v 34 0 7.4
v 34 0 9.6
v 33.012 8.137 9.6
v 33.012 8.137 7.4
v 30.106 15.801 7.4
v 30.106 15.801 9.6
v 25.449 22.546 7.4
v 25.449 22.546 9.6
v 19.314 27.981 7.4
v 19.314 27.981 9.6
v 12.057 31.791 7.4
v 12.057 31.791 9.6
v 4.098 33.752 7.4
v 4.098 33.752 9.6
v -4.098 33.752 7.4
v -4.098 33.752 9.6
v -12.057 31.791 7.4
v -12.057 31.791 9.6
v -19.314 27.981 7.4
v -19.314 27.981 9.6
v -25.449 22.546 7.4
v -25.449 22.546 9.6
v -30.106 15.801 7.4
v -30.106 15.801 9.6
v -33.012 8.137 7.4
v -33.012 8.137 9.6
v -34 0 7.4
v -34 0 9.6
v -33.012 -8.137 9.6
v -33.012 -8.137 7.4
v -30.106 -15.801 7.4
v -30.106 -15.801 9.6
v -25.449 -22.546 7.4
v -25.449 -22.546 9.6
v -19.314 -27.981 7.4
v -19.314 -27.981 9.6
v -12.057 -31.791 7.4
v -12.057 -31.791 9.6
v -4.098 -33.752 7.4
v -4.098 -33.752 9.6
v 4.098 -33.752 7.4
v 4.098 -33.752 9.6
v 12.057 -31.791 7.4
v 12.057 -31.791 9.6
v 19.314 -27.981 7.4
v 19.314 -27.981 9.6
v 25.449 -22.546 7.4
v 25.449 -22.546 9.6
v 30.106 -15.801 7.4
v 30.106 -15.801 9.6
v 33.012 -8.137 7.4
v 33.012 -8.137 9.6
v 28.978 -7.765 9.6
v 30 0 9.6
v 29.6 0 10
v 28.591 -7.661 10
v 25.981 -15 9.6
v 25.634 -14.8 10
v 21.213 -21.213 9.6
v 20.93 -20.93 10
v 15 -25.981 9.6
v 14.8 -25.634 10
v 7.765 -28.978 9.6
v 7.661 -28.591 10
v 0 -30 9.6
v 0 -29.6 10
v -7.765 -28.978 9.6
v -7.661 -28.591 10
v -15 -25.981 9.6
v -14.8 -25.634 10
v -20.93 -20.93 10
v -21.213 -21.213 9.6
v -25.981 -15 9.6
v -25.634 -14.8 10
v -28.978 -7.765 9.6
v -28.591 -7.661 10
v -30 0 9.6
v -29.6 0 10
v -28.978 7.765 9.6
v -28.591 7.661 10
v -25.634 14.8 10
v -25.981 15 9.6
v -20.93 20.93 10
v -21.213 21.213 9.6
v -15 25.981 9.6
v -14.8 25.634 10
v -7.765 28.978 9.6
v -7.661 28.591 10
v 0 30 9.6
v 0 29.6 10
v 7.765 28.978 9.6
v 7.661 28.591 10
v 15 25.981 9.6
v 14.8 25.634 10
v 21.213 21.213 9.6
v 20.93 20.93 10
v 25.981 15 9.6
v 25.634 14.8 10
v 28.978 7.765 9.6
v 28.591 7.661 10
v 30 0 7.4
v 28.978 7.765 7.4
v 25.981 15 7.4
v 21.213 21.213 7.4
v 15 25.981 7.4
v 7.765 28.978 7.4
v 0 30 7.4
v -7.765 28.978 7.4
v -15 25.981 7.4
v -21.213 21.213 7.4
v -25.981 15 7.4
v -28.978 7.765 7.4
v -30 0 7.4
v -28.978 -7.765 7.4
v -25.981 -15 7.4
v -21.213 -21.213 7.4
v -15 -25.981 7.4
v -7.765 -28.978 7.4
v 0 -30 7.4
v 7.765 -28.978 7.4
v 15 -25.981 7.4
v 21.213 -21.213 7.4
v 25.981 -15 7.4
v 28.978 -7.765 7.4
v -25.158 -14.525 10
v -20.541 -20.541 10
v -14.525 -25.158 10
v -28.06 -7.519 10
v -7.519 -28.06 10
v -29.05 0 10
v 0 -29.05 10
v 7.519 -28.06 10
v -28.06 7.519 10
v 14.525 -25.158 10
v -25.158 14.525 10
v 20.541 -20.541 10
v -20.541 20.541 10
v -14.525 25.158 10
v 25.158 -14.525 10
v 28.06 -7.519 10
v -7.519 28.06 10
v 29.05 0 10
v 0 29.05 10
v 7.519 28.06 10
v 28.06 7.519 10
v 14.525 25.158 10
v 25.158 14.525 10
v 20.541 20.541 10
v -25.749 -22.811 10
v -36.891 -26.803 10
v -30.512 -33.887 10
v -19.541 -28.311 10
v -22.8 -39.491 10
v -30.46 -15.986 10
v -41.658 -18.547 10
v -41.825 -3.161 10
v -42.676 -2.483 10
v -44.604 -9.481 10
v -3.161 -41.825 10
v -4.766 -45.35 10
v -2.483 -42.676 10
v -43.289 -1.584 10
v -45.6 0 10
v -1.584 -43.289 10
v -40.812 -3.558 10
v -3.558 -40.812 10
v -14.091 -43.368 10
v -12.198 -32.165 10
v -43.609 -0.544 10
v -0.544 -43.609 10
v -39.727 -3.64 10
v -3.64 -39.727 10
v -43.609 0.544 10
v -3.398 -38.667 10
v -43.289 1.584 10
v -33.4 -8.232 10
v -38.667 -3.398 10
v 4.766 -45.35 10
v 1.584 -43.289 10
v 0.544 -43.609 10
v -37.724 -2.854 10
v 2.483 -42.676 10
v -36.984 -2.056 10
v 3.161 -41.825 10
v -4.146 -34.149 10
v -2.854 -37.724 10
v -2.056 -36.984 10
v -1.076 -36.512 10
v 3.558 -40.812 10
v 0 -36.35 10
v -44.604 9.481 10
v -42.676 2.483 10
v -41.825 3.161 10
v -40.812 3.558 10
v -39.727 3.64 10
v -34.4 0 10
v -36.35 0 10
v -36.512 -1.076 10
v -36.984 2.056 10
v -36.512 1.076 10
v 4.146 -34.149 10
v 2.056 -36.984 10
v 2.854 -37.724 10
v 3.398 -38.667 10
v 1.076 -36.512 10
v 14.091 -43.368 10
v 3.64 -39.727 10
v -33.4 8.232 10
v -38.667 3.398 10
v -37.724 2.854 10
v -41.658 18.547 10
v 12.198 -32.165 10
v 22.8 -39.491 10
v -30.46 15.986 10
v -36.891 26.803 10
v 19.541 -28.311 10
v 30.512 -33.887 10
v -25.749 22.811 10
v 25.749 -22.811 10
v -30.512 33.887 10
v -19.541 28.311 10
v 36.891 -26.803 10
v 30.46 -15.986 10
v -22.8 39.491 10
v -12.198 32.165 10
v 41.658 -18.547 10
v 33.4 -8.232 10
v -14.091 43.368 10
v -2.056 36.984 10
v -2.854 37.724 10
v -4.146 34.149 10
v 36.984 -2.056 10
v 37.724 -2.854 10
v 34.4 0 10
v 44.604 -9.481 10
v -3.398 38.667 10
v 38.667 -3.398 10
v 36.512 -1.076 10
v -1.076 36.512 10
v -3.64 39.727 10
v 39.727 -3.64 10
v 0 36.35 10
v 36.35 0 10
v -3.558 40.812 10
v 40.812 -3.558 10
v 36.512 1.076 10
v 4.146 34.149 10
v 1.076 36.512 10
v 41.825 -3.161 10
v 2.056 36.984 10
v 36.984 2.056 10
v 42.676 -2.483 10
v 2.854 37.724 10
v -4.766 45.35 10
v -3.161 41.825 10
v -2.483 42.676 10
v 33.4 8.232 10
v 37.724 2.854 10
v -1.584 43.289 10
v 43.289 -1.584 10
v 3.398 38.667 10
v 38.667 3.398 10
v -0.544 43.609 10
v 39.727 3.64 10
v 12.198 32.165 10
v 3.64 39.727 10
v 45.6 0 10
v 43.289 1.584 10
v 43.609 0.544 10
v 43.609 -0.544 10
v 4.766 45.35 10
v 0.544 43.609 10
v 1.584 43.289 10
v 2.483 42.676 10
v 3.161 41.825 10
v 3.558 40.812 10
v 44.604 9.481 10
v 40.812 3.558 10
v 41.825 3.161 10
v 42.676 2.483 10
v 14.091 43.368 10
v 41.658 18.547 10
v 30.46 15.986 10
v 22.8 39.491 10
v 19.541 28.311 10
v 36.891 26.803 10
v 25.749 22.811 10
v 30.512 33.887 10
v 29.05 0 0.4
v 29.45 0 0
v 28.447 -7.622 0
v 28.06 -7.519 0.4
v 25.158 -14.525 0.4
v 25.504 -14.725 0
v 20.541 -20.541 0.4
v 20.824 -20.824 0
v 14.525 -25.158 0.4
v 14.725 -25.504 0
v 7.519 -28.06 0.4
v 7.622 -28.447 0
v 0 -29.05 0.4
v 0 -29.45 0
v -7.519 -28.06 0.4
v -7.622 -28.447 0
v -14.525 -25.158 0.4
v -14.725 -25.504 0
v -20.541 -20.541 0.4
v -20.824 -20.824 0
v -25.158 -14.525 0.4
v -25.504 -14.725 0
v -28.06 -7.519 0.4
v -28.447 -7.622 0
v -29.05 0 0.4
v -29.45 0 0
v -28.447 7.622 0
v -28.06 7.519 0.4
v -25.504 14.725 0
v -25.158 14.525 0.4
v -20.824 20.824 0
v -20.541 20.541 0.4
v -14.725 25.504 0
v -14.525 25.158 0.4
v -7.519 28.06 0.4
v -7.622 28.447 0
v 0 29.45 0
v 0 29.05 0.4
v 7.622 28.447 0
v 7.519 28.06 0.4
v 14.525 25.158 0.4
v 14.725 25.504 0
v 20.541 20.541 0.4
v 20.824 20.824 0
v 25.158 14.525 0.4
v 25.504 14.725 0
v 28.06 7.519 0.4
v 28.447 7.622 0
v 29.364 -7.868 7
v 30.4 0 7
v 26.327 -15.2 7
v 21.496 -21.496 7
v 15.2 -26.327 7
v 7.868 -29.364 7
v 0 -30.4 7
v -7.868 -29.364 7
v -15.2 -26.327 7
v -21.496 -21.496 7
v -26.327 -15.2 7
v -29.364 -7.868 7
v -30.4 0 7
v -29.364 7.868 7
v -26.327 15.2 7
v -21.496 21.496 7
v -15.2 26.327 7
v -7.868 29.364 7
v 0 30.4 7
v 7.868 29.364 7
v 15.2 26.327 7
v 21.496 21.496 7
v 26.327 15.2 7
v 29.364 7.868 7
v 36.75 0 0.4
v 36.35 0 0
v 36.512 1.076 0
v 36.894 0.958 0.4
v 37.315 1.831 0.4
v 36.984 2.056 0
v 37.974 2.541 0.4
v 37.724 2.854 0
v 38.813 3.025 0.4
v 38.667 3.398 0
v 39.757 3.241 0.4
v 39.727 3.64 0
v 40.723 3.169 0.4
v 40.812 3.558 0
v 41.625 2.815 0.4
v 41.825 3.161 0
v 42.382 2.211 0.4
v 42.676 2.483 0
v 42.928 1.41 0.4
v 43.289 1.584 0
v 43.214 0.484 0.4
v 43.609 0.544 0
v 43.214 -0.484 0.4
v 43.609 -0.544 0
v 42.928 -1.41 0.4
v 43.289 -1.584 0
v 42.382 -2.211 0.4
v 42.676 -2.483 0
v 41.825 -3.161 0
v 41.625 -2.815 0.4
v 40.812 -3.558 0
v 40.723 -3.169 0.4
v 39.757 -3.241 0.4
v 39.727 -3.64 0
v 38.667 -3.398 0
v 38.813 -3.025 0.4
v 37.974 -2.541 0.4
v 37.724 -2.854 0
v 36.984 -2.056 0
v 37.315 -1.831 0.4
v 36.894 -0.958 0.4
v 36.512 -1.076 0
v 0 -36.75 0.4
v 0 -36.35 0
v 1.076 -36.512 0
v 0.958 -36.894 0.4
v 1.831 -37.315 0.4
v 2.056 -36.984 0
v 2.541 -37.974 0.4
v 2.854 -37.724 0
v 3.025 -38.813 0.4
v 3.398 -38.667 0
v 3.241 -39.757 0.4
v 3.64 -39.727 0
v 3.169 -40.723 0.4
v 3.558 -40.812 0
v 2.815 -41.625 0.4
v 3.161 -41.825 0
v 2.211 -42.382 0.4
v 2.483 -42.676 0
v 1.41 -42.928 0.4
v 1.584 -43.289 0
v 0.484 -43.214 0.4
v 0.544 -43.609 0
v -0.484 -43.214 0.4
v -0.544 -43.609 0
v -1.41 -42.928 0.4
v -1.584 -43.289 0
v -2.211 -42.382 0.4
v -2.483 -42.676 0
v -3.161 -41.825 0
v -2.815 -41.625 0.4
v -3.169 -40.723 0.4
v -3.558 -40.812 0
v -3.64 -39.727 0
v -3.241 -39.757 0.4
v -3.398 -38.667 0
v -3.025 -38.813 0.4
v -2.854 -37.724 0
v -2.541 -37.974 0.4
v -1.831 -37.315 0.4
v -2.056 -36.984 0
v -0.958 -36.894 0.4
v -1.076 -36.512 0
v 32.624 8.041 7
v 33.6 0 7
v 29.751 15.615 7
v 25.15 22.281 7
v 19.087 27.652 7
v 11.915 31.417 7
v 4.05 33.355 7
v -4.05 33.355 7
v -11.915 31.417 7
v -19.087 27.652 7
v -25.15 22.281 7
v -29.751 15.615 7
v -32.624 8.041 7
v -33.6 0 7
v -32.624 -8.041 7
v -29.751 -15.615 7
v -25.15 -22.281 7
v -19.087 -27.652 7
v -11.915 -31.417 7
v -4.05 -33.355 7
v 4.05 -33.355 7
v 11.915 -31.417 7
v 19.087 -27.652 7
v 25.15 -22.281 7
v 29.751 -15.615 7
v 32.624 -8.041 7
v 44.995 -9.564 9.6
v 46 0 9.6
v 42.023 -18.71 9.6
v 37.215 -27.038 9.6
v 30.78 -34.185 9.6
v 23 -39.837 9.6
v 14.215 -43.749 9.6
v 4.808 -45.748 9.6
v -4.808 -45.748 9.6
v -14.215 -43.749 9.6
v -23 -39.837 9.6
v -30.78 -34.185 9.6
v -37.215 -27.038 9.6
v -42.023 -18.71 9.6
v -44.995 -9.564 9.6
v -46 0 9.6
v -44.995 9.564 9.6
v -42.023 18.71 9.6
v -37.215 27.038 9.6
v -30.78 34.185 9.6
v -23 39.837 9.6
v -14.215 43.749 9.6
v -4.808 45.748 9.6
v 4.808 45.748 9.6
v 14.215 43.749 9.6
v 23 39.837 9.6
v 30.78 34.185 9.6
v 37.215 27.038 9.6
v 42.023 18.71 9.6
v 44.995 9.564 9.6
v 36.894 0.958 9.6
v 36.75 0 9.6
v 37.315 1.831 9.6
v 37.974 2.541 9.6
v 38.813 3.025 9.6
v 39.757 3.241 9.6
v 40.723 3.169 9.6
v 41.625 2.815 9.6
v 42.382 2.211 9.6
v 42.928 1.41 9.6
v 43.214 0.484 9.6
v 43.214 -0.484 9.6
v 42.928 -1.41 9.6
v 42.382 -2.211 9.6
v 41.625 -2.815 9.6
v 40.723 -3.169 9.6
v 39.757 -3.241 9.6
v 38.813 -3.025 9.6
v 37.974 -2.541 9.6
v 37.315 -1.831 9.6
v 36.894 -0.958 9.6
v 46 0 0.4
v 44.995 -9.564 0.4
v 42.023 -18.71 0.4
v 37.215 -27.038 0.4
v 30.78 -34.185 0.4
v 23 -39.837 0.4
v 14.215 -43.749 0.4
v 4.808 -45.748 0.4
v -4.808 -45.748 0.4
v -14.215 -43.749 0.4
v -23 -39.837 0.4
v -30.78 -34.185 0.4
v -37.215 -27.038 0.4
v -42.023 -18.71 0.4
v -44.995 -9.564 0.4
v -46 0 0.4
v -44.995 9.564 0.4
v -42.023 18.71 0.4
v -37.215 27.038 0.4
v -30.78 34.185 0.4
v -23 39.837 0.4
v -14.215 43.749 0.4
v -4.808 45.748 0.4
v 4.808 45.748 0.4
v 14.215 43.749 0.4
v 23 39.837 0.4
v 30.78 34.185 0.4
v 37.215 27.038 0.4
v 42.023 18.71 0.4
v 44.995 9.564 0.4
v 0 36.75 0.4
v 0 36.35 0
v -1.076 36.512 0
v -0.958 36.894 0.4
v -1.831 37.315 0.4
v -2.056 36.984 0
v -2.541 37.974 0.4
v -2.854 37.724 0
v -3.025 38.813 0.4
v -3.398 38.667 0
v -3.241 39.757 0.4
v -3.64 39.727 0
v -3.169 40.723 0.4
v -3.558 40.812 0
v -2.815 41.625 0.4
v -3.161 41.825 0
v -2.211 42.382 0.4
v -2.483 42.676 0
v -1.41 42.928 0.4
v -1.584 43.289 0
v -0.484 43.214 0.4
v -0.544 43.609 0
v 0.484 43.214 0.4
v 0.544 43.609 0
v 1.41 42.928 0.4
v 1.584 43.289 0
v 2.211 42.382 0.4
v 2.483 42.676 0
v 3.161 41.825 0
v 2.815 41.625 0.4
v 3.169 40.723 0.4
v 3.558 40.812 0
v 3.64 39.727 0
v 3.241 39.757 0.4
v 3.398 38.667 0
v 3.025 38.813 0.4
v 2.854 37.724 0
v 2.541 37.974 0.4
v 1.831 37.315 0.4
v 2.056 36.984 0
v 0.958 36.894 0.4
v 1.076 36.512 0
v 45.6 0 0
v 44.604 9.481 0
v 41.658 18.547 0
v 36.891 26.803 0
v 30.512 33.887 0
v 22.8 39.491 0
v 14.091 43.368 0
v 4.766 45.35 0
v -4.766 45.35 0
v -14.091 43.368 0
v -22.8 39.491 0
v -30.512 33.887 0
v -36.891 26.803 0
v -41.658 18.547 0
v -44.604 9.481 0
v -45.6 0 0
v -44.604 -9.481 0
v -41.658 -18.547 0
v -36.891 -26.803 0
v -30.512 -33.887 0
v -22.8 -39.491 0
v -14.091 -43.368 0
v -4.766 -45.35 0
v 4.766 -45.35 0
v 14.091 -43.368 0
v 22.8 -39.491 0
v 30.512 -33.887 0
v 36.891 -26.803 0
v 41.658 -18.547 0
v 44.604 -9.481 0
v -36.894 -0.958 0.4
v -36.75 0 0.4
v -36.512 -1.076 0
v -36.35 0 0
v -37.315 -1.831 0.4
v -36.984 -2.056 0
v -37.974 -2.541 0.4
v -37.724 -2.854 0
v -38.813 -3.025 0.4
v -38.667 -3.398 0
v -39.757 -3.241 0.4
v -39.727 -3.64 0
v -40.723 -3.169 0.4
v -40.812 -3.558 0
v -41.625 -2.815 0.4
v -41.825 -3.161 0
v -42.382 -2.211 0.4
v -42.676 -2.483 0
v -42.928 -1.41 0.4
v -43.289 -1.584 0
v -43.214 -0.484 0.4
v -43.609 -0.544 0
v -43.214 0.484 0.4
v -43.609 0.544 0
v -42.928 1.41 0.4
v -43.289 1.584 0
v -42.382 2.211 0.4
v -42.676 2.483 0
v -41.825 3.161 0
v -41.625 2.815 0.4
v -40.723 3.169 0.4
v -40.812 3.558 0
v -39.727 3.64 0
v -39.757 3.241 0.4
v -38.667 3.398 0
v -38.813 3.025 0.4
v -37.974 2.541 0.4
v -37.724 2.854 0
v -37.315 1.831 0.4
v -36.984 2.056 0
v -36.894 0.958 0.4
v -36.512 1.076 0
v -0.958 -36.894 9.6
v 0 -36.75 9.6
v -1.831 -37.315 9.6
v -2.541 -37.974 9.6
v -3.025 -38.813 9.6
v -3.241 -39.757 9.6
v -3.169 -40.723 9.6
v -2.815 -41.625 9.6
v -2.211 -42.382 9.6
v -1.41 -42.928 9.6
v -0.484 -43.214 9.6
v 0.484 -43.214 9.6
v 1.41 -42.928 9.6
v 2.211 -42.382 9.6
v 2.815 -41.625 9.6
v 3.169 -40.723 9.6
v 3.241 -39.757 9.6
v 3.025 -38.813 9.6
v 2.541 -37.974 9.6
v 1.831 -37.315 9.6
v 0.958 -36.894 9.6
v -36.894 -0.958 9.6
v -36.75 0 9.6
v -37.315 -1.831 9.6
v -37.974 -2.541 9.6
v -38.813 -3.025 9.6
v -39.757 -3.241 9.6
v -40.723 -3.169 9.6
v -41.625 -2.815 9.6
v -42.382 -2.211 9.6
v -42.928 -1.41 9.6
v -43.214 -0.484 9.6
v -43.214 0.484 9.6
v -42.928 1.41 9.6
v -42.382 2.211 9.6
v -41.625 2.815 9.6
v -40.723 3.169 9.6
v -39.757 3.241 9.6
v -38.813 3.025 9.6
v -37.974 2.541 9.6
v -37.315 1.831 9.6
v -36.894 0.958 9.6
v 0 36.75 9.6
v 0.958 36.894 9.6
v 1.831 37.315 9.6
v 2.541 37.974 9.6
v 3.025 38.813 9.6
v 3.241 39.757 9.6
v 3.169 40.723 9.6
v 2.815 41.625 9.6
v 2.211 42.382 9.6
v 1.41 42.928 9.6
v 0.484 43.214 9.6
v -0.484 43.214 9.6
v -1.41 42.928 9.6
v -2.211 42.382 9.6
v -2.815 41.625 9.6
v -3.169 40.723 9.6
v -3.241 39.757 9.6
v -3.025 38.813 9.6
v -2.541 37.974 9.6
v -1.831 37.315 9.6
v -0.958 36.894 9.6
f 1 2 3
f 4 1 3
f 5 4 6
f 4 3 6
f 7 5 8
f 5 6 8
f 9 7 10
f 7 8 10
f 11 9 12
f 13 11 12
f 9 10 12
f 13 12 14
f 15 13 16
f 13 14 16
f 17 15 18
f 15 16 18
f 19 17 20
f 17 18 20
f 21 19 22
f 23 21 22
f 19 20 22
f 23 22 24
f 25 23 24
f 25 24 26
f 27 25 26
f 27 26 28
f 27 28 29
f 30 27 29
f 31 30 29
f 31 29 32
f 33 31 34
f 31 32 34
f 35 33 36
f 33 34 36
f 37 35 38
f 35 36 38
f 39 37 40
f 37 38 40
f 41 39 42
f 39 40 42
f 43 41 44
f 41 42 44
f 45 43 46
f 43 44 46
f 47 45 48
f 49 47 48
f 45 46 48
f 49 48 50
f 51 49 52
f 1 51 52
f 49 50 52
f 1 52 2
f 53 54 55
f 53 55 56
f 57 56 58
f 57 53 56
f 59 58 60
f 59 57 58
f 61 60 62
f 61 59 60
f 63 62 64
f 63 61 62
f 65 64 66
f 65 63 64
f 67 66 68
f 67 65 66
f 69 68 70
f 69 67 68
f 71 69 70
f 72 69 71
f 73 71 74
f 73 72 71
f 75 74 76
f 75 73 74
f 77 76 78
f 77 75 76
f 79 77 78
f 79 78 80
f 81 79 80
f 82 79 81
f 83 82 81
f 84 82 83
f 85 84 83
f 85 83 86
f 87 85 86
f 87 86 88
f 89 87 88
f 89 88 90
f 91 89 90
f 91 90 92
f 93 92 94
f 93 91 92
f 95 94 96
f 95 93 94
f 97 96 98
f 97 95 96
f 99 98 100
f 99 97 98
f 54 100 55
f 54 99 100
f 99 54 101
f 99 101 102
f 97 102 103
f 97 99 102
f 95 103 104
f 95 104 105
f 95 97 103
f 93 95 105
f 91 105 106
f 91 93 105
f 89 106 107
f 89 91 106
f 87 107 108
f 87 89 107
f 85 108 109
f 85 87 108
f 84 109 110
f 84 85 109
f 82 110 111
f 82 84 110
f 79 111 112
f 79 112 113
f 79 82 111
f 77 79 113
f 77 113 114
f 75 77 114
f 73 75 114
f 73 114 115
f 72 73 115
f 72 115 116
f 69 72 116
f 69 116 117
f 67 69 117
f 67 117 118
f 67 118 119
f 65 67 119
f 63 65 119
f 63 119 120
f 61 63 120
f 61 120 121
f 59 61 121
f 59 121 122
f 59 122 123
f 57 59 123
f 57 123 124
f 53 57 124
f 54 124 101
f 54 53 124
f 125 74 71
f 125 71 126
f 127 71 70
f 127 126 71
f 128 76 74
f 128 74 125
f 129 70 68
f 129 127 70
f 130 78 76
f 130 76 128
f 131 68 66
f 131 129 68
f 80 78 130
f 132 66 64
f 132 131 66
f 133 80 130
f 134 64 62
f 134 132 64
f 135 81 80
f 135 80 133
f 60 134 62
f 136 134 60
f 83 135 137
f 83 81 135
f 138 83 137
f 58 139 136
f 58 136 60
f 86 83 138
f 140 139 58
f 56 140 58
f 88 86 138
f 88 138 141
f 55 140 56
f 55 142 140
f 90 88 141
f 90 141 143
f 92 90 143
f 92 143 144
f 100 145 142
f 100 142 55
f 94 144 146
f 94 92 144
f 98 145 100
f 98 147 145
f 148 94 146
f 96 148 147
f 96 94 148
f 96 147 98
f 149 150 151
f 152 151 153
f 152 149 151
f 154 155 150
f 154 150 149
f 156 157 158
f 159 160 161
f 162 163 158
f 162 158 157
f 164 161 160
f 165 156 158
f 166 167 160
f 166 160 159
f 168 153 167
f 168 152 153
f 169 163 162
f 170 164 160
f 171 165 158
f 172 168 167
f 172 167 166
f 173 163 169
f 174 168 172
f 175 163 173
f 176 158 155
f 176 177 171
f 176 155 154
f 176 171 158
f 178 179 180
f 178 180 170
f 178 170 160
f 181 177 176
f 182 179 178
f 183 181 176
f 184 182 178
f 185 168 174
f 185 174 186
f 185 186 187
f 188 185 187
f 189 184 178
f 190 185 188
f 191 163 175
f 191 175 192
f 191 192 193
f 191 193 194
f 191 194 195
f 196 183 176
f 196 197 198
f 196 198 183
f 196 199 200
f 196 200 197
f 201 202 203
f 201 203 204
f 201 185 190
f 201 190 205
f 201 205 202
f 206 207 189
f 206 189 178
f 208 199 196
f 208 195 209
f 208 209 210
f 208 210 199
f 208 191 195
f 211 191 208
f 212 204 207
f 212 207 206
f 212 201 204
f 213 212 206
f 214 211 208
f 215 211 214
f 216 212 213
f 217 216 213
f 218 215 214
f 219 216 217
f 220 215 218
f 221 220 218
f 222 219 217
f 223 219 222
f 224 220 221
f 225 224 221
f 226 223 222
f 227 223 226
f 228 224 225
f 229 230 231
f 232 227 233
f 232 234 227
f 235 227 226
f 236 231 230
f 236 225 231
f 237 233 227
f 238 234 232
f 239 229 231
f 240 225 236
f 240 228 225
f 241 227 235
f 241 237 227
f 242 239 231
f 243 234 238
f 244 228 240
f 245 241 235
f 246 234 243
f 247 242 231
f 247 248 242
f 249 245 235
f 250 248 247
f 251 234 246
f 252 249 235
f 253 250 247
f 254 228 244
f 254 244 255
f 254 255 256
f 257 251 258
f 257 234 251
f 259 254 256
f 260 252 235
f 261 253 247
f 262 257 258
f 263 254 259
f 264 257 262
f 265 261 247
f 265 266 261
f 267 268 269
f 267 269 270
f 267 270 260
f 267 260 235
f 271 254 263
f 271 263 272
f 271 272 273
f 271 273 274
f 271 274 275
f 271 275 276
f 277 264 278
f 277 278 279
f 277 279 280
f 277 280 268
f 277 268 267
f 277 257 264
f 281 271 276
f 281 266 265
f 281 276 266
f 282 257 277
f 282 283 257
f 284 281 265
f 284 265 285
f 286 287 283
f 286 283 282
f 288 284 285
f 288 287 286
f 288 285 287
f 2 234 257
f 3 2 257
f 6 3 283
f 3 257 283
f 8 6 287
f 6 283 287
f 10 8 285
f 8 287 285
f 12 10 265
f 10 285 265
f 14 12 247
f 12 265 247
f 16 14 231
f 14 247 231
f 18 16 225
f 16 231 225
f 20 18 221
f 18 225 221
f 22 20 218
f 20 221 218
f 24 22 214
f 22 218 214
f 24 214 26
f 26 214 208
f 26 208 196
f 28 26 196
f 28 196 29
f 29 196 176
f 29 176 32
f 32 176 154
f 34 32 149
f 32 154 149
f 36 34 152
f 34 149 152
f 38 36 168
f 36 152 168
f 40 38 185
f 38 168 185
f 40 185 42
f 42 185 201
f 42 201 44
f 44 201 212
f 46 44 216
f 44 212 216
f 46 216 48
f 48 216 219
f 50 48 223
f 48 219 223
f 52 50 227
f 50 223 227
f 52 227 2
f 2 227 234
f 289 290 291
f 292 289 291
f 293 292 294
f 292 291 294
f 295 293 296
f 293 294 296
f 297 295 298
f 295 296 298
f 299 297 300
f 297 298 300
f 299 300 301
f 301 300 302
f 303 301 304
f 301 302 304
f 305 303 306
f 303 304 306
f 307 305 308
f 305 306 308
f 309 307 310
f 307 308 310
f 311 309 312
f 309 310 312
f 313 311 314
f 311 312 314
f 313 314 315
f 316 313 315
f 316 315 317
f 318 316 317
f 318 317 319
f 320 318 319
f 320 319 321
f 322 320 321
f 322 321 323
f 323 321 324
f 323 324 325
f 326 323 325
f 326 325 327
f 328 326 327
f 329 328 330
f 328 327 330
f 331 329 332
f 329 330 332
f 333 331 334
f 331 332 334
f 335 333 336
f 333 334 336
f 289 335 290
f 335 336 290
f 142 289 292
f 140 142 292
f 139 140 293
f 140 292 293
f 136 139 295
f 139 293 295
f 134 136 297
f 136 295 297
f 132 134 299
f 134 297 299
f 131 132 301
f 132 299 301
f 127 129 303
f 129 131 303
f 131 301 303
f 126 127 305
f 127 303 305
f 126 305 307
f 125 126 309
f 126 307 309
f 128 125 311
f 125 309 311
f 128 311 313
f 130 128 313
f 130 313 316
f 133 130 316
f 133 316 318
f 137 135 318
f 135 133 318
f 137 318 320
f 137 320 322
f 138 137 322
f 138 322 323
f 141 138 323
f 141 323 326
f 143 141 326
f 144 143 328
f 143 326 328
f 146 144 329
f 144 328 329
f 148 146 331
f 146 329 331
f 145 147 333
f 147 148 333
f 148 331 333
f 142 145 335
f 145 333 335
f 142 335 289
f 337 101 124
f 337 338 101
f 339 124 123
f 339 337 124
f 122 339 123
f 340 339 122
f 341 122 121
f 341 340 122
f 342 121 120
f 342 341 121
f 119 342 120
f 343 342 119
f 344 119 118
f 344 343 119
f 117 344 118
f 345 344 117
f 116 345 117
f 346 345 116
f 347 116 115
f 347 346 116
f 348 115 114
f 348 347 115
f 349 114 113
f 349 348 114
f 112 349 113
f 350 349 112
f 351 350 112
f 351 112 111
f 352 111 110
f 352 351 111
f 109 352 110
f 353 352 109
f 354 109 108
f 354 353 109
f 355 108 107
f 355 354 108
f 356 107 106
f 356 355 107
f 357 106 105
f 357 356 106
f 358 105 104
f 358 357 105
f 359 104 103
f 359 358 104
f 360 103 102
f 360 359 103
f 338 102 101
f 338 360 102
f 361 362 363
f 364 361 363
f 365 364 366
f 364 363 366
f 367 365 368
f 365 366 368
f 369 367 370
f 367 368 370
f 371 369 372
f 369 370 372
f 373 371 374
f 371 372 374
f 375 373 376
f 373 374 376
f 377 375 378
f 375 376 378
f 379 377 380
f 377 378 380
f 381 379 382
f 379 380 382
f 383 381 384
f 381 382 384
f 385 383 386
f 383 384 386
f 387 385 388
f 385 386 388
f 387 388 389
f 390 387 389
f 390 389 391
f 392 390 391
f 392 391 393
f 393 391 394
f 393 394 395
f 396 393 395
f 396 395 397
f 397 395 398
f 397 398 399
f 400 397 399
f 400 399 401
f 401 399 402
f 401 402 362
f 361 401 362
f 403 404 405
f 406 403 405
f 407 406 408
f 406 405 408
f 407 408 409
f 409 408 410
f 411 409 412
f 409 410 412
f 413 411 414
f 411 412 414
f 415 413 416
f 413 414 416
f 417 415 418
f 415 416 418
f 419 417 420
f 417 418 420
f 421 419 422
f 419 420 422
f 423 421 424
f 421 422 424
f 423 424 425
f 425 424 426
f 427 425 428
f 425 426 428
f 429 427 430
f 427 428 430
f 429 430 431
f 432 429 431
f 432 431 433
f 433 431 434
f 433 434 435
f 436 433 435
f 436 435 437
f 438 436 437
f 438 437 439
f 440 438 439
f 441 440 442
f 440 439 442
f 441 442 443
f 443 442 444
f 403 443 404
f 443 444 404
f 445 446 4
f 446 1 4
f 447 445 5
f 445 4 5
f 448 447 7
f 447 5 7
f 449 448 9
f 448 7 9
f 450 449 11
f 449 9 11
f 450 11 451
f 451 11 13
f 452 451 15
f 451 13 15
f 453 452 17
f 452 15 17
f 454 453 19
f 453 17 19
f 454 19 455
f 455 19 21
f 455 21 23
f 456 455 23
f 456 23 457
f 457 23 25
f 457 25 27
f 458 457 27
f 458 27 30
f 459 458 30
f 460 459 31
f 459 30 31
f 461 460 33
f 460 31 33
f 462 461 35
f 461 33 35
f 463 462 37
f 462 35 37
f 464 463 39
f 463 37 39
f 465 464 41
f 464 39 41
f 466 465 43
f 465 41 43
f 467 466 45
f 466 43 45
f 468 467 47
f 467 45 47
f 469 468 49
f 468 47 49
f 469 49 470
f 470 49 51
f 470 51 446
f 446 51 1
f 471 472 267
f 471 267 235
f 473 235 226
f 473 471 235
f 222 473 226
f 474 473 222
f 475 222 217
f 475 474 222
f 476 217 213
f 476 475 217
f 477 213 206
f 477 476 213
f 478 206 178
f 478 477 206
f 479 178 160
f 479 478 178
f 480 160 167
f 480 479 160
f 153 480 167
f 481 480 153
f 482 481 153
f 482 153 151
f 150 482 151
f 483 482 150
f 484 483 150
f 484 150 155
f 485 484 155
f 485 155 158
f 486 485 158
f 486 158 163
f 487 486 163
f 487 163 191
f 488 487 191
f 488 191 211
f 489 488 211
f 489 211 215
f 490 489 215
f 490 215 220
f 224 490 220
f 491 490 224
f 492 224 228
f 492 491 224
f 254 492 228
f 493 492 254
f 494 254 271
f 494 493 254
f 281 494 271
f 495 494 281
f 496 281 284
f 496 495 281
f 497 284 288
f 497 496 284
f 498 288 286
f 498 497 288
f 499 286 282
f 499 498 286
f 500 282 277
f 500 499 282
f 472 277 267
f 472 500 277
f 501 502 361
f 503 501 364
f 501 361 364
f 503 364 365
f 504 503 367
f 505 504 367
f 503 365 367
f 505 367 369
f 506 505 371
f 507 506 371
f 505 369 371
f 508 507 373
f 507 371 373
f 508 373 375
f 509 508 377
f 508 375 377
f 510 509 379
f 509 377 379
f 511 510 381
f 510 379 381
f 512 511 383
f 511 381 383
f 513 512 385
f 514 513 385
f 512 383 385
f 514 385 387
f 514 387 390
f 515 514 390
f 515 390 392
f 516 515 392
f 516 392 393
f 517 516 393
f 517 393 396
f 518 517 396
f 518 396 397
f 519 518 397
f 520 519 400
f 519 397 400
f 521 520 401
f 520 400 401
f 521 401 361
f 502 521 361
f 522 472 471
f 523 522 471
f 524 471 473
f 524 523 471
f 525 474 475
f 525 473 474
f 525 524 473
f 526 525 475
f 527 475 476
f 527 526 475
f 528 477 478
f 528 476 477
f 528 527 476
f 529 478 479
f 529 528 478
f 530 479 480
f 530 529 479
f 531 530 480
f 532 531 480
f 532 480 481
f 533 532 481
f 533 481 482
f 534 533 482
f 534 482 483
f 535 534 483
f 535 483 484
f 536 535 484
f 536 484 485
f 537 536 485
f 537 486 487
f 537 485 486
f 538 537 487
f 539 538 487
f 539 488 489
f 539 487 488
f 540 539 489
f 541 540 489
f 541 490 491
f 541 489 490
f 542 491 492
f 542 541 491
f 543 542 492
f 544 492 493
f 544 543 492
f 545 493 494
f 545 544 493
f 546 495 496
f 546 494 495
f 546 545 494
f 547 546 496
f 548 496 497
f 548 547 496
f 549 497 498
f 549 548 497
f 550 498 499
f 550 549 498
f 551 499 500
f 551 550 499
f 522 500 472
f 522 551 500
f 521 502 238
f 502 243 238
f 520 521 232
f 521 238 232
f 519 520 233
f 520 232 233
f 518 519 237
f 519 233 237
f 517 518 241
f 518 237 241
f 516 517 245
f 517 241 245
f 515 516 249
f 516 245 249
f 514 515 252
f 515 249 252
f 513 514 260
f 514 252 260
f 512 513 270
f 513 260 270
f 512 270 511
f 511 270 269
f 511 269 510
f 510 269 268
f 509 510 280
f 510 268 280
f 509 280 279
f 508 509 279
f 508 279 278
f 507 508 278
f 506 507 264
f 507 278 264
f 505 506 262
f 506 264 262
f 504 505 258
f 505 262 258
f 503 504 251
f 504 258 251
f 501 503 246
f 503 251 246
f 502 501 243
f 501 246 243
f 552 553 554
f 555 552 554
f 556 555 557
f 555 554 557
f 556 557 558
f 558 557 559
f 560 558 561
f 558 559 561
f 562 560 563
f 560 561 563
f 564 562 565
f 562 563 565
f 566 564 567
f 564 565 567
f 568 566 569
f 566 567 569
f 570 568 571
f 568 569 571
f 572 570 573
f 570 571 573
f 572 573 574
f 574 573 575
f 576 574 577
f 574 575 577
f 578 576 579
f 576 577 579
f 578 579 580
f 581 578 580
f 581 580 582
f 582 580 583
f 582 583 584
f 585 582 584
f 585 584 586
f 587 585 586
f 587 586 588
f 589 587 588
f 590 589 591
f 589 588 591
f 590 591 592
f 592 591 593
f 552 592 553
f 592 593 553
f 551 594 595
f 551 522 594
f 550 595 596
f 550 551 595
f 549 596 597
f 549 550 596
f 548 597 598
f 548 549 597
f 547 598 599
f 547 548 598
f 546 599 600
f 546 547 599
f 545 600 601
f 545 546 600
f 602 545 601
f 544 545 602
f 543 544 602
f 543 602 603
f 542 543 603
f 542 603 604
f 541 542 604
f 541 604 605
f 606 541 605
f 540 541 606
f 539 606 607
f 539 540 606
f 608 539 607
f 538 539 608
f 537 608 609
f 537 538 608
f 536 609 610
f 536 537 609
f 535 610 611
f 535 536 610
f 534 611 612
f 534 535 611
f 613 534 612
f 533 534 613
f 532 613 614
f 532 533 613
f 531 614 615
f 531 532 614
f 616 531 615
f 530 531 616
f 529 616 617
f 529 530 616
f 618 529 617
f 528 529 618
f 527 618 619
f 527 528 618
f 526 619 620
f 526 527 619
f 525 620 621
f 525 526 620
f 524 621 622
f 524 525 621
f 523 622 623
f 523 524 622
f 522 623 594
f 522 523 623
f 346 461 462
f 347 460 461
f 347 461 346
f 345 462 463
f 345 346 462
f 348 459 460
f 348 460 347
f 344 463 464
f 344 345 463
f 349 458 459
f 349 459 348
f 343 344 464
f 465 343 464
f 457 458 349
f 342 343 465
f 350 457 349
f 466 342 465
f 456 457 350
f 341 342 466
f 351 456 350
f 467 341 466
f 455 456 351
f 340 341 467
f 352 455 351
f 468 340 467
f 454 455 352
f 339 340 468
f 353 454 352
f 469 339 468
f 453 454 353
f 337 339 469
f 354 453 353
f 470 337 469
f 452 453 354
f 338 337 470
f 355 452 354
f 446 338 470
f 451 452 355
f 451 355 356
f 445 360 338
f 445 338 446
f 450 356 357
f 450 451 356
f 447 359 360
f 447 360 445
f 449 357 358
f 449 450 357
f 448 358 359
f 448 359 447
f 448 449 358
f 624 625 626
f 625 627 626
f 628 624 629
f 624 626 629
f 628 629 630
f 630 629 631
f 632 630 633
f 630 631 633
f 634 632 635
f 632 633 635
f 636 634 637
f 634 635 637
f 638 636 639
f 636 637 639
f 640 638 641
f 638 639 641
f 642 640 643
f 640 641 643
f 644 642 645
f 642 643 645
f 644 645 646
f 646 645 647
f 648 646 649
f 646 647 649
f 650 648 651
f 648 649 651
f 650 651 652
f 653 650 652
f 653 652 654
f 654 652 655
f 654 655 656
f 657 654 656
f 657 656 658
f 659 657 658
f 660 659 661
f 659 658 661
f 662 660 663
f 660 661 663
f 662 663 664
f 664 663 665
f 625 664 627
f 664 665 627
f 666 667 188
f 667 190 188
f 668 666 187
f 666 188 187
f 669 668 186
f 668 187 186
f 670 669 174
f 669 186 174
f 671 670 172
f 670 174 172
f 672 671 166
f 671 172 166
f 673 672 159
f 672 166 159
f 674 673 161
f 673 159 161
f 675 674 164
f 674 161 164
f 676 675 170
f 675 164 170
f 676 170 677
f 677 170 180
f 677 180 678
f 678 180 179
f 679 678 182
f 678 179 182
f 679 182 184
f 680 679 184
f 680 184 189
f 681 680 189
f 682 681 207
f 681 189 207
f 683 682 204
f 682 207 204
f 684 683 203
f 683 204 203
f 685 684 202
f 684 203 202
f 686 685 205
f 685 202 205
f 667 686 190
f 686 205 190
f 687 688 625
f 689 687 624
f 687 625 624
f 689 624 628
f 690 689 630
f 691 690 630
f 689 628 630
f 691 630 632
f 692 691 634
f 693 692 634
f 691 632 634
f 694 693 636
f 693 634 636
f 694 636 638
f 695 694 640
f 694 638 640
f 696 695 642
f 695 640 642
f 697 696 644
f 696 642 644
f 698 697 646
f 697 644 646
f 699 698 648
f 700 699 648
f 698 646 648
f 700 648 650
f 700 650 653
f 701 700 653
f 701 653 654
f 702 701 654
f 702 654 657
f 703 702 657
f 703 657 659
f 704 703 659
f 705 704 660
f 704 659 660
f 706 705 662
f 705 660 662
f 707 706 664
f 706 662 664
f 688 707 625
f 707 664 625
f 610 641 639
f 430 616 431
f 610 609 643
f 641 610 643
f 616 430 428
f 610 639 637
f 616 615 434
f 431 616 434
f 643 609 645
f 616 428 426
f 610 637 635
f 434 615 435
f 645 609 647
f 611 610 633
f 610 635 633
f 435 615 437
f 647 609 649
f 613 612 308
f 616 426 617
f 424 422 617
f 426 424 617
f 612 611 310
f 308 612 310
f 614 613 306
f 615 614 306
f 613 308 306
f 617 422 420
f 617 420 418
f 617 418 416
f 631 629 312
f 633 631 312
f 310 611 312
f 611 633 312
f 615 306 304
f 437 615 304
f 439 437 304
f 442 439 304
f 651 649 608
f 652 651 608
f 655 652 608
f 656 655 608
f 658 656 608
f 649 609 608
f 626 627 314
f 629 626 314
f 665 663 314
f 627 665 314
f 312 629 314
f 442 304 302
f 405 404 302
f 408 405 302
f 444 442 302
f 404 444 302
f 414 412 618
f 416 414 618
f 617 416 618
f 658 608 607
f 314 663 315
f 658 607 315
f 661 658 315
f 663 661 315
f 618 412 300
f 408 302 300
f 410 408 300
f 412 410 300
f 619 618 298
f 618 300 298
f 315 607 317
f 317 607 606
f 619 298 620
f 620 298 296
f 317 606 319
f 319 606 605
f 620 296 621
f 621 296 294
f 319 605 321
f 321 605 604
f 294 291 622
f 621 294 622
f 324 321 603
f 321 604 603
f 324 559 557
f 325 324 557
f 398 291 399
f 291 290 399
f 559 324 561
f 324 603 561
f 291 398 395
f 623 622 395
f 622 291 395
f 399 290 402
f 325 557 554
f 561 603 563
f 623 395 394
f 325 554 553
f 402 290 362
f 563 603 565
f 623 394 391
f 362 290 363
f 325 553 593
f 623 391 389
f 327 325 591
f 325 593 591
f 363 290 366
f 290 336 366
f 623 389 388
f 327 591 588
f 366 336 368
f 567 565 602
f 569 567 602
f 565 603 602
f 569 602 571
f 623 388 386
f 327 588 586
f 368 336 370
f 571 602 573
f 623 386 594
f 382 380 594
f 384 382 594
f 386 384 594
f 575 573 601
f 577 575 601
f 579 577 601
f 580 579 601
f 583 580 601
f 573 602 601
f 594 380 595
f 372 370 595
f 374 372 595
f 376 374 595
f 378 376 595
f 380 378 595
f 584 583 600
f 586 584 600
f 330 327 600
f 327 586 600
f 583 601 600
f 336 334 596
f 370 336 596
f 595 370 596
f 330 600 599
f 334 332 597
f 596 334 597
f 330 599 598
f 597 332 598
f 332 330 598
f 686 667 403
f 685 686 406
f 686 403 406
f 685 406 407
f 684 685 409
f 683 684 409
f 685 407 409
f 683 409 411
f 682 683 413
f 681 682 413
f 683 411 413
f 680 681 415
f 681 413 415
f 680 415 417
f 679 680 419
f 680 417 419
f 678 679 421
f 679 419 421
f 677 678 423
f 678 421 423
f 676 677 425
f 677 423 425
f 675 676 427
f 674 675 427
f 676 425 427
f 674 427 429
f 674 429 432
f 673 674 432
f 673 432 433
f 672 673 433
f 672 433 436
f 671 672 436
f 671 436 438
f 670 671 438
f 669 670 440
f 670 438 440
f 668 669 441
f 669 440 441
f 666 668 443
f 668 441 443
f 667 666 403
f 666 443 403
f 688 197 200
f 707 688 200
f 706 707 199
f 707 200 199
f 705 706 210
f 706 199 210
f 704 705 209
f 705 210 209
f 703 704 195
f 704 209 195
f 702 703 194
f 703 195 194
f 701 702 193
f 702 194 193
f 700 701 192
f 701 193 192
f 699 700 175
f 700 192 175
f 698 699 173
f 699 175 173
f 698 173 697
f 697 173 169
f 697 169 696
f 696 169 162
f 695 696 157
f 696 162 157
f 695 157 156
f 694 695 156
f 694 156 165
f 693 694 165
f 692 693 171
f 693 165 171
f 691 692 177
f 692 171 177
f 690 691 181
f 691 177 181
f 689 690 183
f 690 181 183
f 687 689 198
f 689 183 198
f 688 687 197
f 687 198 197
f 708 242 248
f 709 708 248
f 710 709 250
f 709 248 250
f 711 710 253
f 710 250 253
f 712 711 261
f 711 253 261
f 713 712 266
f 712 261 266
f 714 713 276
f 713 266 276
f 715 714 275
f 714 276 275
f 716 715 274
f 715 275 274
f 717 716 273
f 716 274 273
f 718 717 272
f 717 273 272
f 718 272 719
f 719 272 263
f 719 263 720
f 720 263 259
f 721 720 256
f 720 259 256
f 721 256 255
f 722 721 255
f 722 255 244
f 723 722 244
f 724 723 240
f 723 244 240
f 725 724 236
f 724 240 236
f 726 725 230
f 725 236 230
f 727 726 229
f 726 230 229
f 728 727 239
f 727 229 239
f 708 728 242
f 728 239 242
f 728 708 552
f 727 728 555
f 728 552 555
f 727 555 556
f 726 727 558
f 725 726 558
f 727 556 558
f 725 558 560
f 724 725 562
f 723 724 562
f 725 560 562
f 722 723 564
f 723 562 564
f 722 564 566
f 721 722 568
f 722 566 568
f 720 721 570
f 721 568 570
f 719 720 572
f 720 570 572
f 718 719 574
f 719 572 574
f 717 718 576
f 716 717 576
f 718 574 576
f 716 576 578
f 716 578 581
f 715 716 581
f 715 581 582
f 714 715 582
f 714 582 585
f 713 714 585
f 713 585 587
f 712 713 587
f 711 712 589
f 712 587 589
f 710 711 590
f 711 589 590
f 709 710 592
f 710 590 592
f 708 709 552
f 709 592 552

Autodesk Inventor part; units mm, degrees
ref_plane "YZ Plane" through (0, 0, 0) normal (1, 0, 0) x (0, 1, 0)
ref_plane "XZ Plane" through (0, 0, 0) normal (0, 1, 0) x (-1, 0, 0)
ref_plane "XY Plane" through (0, 0, 0) normal (0, 0, 1) x (1, 0, 0)
sketch "Sketch1" plane through (0, 0, 0) normal (0, 0, 1) x (1, 0, 0)
  circle A0 centre (0, 0) radius 46
  circle A1 centre (0, 0) radius 29.05
  dimension "d0" = 58.1
  dimension "d1" = 92
extrude "Extrusion1" add sketch "Sketch1" along normal blind 10
sketch "Sketch2" plane through (0, 0, 10) normal (0, 0, 1) x (1, 0, 0)
  circle A0 centre (0, 0) radius 29.05 projected
  circle A1 centre (0, 0) radius 40 construction
  point P0 (0, 40)
  dimension "d4" = 80
hole "Hole1" at (0, 40, 10) direction (0, 0, -1) diameter 6.5 end through all
pattern_circular "Circular Pattern1" count 4 over 360 about axis through (0, 0, 0) along (0, 0, 1) of "Hole1"
sketch "Sketch4" plane through (0, 0, 10) normal (0, 0, 1) x (1, 0, 0)
  circle A0 centre (0, 0) radius 30
  circle A1 centre (0, 0) radius 34
  dimension "d15" = 60
  dimension "d16" = 68
extrude "Extrusion2" cut sketch "Sketch4" against normal blind 3
chamfer "Chamfer1" distance 0.4 angle 45 15 edges at (-46, 0, 0) (-46, 0, 10) (0, 43.25, 0) (-43.25, 0, 0) (43.25, 0, 0) (0, -43.25, 0) (43.25, 0, 10) (0, 43.25, 10) (0, -43.25, 10) (-43.25, 0, 10) (-29.05, 0, 0) (-34, 0, 10) (-34, 0, 7) (-30, 0, 7) (-30, 0, 10)
equation "\"d0\" = ID"
equation "\"d1\" = OD"
equation "\"OD\" = 92"
equation "\"ID\" = 58.1"
properties part number "pld_flange_groove_ak"
